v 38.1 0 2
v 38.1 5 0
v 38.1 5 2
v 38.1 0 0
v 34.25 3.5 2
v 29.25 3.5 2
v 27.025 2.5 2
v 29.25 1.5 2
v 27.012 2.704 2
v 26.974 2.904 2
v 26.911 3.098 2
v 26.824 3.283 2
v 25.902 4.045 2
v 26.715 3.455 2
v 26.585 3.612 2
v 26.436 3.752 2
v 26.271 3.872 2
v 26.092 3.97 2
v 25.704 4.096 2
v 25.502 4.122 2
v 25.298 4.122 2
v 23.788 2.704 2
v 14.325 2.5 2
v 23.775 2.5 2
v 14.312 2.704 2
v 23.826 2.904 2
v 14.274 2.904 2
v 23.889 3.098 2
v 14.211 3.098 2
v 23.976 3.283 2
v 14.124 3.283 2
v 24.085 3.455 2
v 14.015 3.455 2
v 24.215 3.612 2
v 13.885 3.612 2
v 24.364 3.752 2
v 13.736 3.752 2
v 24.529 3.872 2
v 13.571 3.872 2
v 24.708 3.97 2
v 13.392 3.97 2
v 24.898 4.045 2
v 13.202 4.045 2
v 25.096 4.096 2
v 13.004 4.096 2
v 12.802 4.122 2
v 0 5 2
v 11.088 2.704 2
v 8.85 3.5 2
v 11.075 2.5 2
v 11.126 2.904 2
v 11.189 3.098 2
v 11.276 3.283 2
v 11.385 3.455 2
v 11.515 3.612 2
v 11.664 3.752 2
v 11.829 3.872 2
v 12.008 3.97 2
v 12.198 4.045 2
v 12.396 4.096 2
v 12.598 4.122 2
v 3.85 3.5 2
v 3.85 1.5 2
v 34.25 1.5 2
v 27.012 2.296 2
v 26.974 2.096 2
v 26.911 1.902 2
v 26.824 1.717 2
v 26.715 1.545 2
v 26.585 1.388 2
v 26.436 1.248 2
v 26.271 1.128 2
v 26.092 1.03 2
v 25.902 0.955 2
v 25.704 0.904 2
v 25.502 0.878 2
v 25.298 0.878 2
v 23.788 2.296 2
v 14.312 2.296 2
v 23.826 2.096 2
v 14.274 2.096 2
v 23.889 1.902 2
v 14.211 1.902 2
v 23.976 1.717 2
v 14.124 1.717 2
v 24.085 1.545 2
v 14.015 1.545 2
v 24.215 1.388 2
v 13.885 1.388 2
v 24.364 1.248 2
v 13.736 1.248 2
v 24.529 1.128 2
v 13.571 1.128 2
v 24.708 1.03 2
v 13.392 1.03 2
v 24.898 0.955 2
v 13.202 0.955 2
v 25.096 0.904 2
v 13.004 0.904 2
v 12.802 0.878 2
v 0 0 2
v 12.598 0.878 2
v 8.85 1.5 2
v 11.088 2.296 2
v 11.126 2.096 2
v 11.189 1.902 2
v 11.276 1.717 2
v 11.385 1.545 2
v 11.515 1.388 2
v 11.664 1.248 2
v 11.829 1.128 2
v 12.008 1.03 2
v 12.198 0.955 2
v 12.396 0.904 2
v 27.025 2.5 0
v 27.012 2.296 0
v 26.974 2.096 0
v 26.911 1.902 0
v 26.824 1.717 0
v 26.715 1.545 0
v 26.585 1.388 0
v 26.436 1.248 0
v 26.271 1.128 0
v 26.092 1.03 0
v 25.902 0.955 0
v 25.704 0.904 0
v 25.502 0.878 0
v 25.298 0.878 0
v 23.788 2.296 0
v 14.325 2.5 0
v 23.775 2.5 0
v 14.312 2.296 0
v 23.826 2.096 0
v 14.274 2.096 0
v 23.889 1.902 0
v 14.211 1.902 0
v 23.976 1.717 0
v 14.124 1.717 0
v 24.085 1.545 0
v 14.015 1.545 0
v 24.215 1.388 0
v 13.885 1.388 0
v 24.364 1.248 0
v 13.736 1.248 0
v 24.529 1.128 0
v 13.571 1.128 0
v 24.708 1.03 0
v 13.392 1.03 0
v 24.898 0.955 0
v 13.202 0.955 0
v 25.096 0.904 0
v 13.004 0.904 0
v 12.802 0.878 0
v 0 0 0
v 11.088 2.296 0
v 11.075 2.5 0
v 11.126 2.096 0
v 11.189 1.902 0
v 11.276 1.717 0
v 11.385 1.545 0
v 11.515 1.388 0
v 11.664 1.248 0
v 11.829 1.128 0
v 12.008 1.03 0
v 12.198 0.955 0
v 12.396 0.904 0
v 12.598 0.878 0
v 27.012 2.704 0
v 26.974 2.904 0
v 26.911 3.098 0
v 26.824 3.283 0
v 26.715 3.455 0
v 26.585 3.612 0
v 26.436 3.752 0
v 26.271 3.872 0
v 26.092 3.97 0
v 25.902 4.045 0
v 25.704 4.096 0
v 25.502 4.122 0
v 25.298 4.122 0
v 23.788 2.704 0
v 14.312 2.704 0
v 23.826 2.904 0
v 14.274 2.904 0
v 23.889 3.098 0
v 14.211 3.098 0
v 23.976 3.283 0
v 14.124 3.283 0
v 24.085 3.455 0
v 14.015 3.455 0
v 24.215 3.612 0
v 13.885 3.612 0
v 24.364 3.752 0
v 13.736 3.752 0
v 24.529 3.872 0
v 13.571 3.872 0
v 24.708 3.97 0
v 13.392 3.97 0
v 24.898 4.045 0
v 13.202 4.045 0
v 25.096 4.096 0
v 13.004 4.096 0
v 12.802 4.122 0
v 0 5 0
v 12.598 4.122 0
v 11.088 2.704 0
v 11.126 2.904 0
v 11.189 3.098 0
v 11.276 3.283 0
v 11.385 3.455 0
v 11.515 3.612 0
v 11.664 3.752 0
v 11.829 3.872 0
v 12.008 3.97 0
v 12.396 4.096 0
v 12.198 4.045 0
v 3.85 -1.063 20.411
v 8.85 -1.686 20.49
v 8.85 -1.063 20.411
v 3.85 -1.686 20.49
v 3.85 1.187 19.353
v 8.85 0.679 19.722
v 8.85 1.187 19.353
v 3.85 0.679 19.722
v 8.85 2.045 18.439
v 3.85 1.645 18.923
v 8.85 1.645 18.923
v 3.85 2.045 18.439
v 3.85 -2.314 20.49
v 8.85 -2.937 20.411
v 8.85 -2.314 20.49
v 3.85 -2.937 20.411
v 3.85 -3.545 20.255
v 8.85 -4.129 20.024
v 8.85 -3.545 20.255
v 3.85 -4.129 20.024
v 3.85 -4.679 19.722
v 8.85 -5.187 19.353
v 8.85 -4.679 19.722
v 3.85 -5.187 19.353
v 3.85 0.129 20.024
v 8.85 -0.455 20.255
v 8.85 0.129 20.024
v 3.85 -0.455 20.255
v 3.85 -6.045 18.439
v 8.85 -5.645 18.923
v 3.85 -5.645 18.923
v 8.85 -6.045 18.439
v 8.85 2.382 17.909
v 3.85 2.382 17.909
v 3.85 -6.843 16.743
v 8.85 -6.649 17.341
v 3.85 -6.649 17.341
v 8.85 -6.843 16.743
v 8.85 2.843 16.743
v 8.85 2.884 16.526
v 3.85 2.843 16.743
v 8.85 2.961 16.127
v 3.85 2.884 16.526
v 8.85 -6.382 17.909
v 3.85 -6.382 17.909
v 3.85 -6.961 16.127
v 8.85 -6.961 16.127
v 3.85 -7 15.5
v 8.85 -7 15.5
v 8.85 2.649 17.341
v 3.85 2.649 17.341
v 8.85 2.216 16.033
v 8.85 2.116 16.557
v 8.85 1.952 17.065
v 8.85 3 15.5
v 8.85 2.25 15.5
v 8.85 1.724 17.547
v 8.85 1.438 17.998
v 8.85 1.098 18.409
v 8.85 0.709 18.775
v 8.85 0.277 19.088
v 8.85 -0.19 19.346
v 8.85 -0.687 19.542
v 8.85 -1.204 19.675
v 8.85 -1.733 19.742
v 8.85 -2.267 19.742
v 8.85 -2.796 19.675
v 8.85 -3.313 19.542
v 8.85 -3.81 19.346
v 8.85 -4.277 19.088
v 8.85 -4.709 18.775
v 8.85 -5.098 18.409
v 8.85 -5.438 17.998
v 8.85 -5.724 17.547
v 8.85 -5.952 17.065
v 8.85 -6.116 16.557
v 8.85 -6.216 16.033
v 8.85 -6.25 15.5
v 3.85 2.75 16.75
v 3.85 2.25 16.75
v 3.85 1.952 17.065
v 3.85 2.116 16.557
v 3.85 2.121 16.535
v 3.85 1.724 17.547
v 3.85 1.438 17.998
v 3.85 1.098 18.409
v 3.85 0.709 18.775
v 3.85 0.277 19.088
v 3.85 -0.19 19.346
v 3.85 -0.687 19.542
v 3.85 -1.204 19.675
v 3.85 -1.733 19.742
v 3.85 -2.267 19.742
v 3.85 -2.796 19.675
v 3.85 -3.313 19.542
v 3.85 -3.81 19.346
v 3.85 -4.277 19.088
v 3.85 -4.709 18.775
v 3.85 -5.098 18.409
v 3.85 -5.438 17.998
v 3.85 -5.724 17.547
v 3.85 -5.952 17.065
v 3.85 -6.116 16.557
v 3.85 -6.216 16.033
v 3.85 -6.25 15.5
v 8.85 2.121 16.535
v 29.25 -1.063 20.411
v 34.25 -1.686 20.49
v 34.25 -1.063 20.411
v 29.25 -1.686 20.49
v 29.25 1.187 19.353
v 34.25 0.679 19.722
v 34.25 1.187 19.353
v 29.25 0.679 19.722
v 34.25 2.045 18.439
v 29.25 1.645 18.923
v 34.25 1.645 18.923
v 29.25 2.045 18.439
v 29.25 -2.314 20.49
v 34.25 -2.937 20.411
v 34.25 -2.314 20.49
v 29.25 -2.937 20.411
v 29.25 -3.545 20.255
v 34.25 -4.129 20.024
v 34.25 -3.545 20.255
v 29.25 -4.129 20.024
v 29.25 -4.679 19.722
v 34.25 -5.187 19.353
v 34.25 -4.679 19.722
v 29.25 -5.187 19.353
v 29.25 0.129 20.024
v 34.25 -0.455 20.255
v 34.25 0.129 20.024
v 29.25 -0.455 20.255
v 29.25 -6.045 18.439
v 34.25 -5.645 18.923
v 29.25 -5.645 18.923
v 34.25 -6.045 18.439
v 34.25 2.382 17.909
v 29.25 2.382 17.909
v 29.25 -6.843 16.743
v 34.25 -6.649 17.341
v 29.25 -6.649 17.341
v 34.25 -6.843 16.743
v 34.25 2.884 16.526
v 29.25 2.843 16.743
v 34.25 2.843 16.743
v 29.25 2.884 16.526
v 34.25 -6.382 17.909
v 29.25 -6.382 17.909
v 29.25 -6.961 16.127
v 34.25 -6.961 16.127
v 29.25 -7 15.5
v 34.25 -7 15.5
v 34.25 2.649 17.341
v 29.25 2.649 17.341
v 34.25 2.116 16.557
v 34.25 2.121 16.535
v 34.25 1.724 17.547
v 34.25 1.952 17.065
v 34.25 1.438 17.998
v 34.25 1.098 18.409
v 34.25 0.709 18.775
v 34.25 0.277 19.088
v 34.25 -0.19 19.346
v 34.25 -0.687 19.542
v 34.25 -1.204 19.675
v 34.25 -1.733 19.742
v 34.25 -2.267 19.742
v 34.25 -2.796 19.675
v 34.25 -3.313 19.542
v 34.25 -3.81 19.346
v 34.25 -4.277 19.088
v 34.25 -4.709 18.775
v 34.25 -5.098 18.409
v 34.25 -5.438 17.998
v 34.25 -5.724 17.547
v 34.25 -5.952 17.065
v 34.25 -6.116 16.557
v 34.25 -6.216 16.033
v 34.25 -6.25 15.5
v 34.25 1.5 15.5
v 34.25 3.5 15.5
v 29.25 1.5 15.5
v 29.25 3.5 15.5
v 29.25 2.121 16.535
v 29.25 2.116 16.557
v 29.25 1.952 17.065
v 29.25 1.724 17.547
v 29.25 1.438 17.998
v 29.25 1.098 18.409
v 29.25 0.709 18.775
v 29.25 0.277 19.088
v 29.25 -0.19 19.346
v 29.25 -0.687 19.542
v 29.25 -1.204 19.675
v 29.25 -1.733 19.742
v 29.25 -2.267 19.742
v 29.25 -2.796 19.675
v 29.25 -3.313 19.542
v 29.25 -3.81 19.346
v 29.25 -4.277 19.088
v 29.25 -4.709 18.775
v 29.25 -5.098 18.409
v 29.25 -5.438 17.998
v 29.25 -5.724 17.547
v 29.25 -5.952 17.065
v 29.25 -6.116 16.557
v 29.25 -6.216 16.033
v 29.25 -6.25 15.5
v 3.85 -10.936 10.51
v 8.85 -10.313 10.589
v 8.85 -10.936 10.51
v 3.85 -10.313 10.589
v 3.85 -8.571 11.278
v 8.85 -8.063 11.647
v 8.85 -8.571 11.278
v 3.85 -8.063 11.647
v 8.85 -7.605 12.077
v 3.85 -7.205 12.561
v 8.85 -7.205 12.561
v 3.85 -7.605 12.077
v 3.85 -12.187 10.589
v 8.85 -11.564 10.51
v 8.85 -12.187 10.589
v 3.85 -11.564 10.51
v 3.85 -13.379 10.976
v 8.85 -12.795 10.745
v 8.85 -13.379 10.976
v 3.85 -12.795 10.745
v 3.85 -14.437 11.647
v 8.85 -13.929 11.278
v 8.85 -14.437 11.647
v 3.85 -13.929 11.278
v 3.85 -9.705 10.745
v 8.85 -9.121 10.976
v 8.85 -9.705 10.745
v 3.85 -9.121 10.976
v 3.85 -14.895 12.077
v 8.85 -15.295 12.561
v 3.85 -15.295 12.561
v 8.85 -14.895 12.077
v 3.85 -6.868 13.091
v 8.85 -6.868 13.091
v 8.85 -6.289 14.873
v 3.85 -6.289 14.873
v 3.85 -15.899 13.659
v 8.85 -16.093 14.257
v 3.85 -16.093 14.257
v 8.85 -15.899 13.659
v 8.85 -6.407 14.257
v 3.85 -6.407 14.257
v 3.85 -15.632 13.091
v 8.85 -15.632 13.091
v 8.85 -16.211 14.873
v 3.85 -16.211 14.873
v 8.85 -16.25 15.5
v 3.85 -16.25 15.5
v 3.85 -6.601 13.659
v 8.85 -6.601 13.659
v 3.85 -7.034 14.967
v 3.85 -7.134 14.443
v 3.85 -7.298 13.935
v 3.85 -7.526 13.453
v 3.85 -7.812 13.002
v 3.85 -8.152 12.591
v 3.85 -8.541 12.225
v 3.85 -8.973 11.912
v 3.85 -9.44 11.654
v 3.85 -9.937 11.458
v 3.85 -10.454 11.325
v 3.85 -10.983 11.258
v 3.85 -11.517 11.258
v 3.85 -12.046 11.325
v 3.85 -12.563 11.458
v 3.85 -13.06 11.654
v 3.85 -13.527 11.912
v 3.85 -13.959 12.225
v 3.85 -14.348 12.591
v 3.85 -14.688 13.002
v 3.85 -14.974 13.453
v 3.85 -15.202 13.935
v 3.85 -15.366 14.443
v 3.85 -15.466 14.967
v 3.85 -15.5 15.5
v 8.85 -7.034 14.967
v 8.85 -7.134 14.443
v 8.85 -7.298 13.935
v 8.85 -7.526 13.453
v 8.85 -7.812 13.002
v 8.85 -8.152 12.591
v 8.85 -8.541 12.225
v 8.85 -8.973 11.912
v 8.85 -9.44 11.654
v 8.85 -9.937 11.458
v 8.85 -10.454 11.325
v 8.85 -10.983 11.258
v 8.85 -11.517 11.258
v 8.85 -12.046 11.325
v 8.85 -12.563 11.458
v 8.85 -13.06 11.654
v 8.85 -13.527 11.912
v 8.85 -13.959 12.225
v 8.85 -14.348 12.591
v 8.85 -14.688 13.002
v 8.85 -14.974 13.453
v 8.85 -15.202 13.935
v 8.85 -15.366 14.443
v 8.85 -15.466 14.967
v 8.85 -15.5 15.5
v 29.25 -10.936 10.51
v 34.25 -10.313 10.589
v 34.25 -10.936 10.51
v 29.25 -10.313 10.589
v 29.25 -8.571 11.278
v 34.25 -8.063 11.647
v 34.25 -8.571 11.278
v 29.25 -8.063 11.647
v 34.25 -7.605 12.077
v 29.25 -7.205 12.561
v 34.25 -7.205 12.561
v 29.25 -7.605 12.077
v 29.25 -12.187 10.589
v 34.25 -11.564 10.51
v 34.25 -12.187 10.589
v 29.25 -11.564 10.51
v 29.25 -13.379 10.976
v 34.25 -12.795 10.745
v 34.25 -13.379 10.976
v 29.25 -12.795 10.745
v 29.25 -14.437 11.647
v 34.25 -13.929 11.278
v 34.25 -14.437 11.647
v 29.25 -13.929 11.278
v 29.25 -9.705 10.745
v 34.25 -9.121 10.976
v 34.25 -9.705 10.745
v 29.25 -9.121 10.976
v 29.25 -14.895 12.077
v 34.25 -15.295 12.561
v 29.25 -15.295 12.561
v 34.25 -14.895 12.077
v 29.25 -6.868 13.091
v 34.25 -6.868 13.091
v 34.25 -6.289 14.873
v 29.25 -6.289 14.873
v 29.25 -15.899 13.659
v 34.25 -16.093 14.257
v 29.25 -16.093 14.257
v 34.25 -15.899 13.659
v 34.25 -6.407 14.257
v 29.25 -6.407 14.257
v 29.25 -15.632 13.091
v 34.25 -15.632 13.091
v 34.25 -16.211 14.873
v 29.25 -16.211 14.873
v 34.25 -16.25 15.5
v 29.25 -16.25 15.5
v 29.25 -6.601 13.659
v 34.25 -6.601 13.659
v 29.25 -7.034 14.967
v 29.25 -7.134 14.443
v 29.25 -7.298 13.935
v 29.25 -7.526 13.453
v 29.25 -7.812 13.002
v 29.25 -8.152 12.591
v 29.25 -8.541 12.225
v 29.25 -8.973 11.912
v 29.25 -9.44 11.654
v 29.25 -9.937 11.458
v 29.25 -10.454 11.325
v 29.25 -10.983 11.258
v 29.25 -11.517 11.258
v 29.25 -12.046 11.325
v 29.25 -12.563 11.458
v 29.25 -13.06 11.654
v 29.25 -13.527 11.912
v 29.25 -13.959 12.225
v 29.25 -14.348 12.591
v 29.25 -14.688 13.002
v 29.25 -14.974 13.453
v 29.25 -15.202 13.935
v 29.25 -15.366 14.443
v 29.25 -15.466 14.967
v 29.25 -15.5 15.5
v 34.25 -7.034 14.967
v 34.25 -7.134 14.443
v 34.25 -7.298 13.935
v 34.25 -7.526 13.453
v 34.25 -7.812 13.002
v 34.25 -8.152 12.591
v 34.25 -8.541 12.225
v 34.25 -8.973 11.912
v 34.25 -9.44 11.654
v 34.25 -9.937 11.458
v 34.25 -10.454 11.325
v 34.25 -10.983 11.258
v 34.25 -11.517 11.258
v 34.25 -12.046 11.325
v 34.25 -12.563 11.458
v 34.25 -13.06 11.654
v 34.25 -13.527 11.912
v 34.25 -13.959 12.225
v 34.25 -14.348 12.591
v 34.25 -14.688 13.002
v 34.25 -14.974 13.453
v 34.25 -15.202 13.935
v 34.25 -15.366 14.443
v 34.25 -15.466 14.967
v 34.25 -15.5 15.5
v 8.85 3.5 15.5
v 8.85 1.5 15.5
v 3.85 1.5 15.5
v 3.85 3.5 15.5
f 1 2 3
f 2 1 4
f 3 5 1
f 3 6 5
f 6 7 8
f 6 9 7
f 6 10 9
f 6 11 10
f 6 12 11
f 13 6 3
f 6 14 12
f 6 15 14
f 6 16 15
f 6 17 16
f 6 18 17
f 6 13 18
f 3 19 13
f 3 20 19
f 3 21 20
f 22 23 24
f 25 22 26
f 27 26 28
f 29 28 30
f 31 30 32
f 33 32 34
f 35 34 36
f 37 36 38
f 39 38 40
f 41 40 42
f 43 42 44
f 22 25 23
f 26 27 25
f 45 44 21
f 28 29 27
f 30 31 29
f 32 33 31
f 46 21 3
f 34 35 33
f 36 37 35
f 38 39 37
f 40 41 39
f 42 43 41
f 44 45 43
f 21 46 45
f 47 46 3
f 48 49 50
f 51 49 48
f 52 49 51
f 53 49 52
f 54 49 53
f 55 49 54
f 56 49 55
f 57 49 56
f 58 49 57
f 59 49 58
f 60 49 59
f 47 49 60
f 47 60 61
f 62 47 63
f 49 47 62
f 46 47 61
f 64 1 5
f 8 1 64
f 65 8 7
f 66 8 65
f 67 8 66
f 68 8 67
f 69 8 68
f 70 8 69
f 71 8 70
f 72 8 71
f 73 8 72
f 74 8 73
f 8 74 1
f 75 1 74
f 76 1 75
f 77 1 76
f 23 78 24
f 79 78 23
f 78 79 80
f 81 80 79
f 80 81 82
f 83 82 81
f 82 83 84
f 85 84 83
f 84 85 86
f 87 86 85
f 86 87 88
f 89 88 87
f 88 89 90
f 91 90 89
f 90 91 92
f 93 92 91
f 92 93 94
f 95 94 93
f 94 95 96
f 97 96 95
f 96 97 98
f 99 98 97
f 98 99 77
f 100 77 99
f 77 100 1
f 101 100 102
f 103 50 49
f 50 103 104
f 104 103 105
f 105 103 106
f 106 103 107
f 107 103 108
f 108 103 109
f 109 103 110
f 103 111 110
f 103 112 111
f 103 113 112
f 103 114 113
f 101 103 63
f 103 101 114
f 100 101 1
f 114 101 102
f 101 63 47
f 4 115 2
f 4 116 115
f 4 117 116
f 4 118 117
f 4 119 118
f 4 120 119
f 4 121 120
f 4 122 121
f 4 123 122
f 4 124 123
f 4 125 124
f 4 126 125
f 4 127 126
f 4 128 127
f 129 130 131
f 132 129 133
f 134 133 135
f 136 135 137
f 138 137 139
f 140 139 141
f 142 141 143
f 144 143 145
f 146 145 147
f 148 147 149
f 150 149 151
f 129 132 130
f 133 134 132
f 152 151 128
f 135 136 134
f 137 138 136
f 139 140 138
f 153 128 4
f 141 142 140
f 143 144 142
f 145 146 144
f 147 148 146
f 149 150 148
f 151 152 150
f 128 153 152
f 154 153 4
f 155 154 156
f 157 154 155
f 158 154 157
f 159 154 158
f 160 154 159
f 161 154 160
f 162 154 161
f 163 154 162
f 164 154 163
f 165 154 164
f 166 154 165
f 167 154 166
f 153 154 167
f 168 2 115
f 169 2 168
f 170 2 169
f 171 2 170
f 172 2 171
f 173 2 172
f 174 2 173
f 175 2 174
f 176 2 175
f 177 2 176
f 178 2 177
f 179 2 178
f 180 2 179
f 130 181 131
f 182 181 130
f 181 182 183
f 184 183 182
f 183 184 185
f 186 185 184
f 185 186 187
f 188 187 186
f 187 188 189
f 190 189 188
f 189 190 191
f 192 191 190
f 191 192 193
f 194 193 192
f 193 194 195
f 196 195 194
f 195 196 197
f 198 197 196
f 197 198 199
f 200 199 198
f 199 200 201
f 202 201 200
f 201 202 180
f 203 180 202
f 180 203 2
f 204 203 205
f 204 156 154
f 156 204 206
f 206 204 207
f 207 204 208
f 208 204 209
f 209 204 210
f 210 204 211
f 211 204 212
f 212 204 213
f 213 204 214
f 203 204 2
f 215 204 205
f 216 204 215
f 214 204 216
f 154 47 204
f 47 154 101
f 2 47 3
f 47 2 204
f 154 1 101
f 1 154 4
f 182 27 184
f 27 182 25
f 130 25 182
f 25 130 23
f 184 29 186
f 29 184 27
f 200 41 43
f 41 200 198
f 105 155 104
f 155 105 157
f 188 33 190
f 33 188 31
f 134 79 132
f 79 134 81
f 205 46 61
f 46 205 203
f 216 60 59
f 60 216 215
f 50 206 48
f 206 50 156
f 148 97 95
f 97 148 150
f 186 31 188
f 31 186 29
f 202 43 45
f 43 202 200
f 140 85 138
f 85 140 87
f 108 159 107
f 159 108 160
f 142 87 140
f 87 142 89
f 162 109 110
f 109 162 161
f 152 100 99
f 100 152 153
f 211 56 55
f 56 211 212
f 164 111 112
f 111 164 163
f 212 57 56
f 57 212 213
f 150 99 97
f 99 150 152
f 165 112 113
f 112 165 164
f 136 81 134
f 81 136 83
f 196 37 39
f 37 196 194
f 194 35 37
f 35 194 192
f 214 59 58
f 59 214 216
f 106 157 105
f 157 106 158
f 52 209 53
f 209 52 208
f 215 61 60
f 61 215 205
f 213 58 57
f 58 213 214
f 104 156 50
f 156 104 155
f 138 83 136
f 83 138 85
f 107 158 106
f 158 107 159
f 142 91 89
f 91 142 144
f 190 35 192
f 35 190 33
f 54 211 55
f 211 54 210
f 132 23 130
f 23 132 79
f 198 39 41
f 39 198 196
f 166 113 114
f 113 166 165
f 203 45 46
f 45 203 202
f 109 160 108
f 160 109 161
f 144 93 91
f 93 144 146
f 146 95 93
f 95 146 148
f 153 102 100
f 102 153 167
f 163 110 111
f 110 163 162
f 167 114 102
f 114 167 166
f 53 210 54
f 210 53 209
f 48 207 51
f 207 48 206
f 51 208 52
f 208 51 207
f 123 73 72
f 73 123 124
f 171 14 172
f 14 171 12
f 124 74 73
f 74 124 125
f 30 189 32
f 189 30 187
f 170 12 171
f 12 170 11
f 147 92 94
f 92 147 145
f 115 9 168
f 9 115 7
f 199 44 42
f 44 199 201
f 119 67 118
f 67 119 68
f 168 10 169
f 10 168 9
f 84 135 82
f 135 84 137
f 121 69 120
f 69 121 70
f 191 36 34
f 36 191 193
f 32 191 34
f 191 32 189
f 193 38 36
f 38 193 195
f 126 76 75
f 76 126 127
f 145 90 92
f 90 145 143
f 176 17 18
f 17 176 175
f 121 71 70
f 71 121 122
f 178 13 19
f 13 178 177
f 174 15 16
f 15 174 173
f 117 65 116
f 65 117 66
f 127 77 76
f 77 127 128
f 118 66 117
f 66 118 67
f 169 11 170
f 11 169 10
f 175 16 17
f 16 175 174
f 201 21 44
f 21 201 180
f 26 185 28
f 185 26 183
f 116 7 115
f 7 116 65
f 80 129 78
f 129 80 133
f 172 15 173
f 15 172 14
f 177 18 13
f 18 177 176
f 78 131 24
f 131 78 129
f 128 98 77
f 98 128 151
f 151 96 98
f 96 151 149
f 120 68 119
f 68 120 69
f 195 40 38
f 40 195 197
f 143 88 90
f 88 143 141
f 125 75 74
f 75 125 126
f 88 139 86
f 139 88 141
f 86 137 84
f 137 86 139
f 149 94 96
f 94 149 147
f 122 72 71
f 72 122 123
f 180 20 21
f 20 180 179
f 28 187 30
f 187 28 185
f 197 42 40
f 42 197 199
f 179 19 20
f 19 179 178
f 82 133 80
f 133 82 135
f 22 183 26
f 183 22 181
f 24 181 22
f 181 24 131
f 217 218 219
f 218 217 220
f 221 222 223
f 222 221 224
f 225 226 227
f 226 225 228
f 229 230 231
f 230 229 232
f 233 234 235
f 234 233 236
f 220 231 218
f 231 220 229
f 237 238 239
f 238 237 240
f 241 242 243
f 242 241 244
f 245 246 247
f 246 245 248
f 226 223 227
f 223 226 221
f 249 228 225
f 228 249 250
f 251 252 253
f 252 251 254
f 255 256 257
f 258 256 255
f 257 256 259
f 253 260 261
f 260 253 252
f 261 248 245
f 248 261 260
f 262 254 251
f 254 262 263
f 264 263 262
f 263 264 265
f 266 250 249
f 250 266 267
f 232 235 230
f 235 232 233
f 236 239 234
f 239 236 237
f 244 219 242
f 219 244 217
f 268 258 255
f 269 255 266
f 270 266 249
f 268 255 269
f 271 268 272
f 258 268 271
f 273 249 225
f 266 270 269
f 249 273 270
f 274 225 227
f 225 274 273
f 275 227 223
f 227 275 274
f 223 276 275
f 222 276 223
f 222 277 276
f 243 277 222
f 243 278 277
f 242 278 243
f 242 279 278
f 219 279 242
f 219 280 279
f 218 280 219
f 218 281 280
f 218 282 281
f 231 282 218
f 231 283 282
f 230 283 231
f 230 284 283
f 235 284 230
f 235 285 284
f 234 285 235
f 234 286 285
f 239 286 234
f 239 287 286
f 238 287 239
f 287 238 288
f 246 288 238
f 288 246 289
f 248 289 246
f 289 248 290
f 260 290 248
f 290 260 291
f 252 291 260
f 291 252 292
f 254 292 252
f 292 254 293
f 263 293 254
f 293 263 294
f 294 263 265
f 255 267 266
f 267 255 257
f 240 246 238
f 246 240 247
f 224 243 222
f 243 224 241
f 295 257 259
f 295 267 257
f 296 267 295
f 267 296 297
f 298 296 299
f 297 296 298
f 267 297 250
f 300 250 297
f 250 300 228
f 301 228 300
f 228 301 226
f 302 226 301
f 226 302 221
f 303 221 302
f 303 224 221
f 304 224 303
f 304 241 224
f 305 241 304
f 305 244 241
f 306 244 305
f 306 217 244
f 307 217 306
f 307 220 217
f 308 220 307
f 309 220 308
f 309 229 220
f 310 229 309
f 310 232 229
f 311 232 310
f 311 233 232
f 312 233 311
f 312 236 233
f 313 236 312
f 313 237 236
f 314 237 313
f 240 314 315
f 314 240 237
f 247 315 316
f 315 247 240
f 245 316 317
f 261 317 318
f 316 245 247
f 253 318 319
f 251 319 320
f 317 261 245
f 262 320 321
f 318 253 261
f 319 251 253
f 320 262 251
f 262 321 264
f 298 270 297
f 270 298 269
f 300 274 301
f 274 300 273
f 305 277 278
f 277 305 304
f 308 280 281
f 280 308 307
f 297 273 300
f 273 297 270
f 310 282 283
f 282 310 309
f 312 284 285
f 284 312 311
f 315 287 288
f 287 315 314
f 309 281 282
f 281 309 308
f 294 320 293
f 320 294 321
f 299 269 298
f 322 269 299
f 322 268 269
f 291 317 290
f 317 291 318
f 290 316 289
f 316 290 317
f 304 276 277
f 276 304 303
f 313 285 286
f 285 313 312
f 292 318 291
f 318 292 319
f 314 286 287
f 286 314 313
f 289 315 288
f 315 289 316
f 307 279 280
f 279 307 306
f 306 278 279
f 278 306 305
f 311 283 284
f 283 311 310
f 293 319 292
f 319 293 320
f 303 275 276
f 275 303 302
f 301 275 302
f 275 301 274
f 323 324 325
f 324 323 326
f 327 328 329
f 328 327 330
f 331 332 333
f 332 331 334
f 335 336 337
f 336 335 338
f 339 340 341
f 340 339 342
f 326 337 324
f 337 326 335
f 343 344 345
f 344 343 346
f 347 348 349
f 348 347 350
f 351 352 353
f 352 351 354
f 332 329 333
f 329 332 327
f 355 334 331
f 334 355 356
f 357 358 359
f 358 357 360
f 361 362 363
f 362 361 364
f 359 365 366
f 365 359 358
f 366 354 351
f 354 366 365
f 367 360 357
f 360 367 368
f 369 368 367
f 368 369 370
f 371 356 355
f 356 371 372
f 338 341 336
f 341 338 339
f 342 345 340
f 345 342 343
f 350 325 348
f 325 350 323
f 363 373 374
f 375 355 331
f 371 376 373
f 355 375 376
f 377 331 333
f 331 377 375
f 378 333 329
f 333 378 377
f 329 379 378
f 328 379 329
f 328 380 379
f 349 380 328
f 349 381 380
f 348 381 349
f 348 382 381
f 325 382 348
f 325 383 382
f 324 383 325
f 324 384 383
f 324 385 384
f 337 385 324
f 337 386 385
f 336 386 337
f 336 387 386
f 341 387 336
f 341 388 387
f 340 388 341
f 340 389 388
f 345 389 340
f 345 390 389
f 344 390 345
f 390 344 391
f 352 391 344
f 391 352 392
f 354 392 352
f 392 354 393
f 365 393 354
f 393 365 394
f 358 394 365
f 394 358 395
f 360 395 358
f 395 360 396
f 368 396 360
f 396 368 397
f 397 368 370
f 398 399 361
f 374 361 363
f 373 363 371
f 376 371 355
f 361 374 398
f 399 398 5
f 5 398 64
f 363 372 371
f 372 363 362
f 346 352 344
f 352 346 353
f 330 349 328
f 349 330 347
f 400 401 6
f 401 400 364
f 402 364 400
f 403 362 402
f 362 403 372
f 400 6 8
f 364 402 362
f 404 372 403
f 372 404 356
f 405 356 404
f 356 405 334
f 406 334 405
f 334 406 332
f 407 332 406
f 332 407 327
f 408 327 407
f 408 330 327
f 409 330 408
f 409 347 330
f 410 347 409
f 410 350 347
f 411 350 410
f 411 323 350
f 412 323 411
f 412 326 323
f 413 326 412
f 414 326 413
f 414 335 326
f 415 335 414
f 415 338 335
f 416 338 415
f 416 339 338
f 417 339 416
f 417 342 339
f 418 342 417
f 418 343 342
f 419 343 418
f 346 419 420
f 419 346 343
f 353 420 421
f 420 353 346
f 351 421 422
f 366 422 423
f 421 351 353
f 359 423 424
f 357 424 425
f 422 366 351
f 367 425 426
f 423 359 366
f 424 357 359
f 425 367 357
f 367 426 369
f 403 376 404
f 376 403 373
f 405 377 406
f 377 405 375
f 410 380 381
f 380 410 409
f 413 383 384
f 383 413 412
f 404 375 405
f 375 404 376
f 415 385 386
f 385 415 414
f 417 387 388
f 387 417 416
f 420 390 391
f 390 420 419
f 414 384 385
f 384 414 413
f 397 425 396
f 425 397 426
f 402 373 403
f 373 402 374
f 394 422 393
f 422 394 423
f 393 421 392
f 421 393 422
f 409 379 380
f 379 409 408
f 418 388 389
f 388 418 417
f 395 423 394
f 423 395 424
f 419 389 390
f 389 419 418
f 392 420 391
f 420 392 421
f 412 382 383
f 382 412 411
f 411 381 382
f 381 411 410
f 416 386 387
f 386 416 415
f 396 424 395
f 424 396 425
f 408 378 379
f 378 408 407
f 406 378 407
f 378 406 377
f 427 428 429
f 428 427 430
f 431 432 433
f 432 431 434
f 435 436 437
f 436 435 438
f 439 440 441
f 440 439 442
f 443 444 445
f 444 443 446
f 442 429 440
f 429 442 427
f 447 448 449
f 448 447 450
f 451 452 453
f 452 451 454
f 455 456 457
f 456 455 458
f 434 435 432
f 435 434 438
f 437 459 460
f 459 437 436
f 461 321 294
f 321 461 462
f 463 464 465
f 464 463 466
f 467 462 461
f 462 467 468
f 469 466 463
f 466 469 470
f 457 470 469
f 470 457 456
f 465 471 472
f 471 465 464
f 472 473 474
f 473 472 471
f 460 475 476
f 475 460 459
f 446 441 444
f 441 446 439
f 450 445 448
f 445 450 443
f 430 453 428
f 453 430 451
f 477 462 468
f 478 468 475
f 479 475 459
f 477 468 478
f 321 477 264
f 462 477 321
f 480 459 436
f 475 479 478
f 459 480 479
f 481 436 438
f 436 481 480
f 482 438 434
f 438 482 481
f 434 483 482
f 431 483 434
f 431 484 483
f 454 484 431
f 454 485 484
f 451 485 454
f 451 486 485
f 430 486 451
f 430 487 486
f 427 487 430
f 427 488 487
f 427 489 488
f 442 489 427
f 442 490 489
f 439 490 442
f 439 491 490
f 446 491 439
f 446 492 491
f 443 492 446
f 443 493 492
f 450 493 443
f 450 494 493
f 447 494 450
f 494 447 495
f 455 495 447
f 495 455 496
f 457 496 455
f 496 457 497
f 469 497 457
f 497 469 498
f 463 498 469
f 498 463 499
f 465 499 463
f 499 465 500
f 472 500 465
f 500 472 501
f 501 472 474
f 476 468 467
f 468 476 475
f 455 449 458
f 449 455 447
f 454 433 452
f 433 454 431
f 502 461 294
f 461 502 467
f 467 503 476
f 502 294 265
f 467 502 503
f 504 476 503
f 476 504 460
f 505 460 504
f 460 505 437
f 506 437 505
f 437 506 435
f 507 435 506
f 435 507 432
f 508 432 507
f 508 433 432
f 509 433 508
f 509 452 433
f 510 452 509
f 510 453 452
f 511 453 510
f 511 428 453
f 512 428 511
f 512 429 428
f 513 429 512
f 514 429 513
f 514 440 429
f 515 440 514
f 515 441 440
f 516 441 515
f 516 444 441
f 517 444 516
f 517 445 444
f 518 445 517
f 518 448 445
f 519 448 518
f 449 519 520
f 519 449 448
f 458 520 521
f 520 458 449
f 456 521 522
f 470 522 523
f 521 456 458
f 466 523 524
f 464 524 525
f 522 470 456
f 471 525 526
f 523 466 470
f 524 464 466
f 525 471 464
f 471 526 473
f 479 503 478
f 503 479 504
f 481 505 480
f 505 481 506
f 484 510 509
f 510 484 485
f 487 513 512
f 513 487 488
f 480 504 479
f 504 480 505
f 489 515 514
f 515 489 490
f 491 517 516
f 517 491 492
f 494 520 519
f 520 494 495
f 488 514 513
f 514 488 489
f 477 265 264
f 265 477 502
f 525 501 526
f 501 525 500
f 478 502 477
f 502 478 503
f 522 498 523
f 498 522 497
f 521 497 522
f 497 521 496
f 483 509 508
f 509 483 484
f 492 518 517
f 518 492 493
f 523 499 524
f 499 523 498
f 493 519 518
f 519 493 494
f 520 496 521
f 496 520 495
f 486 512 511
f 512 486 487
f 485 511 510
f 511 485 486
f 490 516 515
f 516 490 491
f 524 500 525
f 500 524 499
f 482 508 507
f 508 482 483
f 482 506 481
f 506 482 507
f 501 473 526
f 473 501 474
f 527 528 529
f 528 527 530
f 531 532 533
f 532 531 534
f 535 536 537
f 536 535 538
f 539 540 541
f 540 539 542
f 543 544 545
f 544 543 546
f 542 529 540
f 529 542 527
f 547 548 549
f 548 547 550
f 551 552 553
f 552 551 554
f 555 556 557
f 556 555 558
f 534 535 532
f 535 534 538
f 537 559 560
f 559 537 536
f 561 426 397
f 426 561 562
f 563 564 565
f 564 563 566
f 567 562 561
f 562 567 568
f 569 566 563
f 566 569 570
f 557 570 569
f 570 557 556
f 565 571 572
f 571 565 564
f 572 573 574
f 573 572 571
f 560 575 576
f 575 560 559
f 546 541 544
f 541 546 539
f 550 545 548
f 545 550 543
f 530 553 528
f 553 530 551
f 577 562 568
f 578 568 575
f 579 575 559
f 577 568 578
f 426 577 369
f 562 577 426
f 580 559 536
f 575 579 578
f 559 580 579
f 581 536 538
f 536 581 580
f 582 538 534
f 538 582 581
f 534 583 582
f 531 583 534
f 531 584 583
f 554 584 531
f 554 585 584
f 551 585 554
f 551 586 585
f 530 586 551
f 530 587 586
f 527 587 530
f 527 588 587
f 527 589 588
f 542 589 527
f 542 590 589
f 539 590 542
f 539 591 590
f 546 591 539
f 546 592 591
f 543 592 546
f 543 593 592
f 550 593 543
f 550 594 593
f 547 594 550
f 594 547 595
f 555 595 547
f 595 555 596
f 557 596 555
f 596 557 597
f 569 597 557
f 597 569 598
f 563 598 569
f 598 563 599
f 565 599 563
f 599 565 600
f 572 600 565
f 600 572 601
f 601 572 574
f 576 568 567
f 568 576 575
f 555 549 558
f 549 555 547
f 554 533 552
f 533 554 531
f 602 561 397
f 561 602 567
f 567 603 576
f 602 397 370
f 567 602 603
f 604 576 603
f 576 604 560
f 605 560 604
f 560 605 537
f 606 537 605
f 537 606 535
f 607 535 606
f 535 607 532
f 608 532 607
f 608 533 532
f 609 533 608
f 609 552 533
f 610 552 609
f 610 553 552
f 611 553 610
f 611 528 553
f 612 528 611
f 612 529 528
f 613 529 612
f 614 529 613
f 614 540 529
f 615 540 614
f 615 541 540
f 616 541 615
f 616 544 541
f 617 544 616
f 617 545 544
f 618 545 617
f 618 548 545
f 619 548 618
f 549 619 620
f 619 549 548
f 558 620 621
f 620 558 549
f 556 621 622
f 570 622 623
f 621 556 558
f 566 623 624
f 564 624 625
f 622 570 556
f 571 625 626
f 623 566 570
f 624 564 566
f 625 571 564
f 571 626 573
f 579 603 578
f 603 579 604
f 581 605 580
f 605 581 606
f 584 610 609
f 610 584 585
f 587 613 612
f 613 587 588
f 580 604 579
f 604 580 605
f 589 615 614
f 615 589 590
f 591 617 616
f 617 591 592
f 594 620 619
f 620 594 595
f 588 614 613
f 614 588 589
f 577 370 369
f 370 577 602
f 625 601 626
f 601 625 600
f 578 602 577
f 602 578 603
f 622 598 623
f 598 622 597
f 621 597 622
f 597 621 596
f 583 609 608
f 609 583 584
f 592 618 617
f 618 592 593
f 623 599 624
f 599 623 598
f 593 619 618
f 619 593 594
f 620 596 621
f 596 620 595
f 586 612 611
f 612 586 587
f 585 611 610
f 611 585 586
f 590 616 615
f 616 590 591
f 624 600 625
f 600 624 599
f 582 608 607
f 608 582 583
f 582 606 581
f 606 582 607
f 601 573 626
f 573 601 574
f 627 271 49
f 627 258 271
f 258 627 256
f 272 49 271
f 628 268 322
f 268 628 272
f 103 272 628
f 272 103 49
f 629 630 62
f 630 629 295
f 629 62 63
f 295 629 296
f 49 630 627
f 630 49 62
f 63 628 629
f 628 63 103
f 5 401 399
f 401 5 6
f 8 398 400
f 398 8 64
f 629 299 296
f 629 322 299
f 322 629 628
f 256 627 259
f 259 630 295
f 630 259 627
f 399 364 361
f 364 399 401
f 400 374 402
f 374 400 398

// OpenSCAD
$fn=50;
inch = 25.4;

height=16.5;

union() {

difference() {
	cube([1.5 * inch, 5, 2]);
	translate([.5*inch,2.5,0]) cylinder(d=3.25,h=2);
	translate([1*inch,2.5,0]) cylinder(d=3.25,h=2);
}

translate([.25*inch-2.5,1.5,2]) cube([5, 2, height-3]);
translate([1.25*inch-2.5,1.5,2]) cube([5,2,height-3]);

translate([.25*inch-2.5, 1.5, height-1])rotate([90,0,90]) linear_extrude(5) polygon([[0,0],[2,0],[1.25,1.25],[.75,1.25]]);

translate([1.25*inch-2.5, 1.5, height-1])rotate([90,0,90]) linear_extrude(5) polygon([[0,0],[2,0],[1.25,1.25],[.75,1.25]]);

translate([.25*inch+2.5, -2, height-1]) rotate([-90,0,90]) difference() {
	cylinder(r=5,h=5);
	cylinder(r=4.25,h=5);
	translate([-5,0,0]) cube([10,5,5]);
}

translate([1.25*inch+2.5, -2, height-1]) rotate([-90,0,90]) difference() {
	cylinder(r=5,h=5);
	cylinder(r=4.25,h=5);
	translate([-5,0,0]) cube([10,5,5]);
}

translate([.25*inch-2.5, -11.25, height-1]) rotate([90,0,90]) difference() {
	cylinder(r=5,h=5);
	cylinder(r=4.25,h=5);
	translate([-5,0,0]) cube([10,5,5]);
}

translate([1.25*inch-2.5, -11.25, height-1]) rotate([90,0,90]) difference() {
	cylinder(r=5,h=5);
	cylinder(r=4.25,h=5);
	translate([-5,0,0]) cube([10,5,5]);
}
}
